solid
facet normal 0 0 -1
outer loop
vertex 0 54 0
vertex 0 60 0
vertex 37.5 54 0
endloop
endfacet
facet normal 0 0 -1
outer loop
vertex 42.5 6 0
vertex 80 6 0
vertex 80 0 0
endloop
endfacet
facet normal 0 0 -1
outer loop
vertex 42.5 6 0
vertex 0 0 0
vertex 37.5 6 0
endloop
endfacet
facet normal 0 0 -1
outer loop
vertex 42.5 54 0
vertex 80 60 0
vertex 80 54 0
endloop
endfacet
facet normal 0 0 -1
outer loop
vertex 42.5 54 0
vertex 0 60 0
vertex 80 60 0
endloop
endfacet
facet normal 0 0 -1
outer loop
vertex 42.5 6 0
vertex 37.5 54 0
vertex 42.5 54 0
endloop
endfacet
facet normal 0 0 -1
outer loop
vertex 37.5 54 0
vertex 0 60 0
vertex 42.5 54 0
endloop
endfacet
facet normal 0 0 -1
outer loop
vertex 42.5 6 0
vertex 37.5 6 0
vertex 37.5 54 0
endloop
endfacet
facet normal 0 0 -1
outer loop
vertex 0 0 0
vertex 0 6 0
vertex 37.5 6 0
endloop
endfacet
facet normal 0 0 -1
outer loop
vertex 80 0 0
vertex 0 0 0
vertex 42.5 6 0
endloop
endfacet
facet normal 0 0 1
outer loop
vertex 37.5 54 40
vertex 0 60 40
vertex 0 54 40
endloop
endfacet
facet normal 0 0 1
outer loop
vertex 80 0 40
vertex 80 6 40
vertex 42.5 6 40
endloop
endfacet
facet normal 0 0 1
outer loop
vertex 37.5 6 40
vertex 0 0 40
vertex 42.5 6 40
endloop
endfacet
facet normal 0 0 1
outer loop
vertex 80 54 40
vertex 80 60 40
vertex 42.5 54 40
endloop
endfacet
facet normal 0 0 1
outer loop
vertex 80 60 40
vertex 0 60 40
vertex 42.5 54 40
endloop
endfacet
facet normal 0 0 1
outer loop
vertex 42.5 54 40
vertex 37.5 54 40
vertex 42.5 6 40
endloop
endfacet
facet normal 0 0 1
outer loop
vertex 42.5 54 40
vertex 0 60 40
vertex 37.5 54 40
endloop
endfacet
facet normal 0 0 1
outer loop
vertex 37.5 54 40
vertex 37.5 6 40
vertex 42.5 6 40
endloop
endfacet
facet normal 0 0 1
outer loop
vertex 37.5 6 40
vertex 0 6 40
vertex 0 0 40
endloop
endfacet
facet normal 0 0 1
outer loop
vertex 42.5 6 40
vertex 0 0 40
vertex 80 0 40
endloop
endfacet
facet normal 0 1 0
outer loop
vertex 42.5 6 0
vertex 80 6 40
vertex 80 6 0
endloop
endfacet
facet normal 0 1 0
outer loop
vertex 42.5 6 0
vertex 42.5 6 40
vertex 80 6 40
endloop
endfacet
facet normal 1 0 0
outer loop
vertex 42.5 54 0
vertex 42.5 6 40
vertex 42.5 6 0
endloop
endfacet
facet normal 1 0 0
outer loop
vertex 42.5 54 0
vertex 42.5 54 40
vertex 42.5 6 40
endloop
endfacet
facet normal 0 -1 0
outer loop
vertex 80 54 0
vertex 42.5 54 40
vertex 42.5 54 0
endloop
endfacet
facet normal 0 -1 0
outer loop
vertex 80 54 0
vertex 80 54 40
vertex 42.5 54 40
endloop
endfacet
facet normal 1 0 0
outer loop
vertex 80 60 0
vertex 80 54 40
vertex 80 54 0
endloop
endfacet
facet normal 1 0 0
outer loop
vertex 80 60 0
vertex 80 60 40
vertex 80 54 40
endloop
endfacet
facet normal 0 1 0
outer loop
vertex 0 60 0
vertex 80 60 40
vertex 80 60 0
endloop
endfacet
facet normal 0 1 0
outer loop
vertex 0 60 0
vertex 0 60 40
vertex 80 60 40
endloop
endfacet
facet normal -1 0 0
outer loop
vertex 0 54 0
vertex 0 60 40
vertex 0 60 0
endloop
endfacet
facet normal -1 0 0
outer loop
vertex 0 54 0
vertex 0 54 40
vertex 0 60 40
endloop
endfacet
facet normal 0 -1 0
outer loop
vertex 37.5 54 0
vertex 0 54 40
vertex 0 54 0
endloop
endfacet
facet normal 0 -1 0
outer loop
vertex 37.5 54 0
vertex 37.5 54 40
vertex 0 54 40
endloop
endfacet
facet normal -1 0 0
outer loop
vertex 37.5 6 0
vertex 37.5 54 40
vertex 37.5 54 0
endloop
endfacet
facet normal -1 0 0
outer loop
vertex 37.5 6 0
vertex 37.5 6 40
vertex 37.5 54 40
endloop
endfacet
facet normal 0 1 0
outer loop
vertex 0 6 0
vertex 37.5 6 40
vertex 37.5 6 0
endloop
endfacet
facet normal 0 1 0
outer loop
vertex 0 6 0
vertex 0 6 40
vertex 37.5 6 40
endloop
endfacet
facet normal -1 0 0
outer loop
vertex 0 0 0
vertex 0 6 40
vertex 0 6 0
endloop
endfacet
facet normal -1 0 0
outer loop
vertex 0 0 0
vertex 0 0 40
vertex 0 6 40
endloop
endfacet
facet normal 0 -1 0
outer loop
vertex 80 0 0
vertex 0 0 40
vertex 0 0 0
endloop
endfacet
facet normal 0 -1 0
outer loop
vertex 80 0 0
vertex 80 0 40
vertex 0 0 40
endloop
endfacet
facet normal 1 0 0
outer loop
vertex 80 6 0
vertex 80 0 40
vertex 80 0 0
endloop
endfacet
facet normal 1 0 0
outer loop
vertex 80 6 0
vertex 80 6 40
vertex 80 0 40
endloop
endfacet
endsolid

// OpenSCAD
$fn = 32;

// ----------------------------------------------------------------------
// Structural section: ibeam 80 x 60 mm
// ----------------------------------------------------------------------

// --- parameters (mm) ---
sec_w = 80;               // section width, X
sec_h = 60;               // section height, Y
flange_t = 6;             // flange thickness
web_t = 5;                // web thickness
plate_t = 40;             // cut length, Z (extrusion height)

profile = [[0, 0], [80, 0], [80, 6], [42.5, 6], [42.5, 54], [80, 54], [80, 60], [0, 60], [0, 54], [37.5, 54], [37.5, 6], [0, 6]];  // primary outline, 12 points, counter clockwise

// --- the one profile operation ---
linear_extrude(height = plate_t) polygon(points = profile);
